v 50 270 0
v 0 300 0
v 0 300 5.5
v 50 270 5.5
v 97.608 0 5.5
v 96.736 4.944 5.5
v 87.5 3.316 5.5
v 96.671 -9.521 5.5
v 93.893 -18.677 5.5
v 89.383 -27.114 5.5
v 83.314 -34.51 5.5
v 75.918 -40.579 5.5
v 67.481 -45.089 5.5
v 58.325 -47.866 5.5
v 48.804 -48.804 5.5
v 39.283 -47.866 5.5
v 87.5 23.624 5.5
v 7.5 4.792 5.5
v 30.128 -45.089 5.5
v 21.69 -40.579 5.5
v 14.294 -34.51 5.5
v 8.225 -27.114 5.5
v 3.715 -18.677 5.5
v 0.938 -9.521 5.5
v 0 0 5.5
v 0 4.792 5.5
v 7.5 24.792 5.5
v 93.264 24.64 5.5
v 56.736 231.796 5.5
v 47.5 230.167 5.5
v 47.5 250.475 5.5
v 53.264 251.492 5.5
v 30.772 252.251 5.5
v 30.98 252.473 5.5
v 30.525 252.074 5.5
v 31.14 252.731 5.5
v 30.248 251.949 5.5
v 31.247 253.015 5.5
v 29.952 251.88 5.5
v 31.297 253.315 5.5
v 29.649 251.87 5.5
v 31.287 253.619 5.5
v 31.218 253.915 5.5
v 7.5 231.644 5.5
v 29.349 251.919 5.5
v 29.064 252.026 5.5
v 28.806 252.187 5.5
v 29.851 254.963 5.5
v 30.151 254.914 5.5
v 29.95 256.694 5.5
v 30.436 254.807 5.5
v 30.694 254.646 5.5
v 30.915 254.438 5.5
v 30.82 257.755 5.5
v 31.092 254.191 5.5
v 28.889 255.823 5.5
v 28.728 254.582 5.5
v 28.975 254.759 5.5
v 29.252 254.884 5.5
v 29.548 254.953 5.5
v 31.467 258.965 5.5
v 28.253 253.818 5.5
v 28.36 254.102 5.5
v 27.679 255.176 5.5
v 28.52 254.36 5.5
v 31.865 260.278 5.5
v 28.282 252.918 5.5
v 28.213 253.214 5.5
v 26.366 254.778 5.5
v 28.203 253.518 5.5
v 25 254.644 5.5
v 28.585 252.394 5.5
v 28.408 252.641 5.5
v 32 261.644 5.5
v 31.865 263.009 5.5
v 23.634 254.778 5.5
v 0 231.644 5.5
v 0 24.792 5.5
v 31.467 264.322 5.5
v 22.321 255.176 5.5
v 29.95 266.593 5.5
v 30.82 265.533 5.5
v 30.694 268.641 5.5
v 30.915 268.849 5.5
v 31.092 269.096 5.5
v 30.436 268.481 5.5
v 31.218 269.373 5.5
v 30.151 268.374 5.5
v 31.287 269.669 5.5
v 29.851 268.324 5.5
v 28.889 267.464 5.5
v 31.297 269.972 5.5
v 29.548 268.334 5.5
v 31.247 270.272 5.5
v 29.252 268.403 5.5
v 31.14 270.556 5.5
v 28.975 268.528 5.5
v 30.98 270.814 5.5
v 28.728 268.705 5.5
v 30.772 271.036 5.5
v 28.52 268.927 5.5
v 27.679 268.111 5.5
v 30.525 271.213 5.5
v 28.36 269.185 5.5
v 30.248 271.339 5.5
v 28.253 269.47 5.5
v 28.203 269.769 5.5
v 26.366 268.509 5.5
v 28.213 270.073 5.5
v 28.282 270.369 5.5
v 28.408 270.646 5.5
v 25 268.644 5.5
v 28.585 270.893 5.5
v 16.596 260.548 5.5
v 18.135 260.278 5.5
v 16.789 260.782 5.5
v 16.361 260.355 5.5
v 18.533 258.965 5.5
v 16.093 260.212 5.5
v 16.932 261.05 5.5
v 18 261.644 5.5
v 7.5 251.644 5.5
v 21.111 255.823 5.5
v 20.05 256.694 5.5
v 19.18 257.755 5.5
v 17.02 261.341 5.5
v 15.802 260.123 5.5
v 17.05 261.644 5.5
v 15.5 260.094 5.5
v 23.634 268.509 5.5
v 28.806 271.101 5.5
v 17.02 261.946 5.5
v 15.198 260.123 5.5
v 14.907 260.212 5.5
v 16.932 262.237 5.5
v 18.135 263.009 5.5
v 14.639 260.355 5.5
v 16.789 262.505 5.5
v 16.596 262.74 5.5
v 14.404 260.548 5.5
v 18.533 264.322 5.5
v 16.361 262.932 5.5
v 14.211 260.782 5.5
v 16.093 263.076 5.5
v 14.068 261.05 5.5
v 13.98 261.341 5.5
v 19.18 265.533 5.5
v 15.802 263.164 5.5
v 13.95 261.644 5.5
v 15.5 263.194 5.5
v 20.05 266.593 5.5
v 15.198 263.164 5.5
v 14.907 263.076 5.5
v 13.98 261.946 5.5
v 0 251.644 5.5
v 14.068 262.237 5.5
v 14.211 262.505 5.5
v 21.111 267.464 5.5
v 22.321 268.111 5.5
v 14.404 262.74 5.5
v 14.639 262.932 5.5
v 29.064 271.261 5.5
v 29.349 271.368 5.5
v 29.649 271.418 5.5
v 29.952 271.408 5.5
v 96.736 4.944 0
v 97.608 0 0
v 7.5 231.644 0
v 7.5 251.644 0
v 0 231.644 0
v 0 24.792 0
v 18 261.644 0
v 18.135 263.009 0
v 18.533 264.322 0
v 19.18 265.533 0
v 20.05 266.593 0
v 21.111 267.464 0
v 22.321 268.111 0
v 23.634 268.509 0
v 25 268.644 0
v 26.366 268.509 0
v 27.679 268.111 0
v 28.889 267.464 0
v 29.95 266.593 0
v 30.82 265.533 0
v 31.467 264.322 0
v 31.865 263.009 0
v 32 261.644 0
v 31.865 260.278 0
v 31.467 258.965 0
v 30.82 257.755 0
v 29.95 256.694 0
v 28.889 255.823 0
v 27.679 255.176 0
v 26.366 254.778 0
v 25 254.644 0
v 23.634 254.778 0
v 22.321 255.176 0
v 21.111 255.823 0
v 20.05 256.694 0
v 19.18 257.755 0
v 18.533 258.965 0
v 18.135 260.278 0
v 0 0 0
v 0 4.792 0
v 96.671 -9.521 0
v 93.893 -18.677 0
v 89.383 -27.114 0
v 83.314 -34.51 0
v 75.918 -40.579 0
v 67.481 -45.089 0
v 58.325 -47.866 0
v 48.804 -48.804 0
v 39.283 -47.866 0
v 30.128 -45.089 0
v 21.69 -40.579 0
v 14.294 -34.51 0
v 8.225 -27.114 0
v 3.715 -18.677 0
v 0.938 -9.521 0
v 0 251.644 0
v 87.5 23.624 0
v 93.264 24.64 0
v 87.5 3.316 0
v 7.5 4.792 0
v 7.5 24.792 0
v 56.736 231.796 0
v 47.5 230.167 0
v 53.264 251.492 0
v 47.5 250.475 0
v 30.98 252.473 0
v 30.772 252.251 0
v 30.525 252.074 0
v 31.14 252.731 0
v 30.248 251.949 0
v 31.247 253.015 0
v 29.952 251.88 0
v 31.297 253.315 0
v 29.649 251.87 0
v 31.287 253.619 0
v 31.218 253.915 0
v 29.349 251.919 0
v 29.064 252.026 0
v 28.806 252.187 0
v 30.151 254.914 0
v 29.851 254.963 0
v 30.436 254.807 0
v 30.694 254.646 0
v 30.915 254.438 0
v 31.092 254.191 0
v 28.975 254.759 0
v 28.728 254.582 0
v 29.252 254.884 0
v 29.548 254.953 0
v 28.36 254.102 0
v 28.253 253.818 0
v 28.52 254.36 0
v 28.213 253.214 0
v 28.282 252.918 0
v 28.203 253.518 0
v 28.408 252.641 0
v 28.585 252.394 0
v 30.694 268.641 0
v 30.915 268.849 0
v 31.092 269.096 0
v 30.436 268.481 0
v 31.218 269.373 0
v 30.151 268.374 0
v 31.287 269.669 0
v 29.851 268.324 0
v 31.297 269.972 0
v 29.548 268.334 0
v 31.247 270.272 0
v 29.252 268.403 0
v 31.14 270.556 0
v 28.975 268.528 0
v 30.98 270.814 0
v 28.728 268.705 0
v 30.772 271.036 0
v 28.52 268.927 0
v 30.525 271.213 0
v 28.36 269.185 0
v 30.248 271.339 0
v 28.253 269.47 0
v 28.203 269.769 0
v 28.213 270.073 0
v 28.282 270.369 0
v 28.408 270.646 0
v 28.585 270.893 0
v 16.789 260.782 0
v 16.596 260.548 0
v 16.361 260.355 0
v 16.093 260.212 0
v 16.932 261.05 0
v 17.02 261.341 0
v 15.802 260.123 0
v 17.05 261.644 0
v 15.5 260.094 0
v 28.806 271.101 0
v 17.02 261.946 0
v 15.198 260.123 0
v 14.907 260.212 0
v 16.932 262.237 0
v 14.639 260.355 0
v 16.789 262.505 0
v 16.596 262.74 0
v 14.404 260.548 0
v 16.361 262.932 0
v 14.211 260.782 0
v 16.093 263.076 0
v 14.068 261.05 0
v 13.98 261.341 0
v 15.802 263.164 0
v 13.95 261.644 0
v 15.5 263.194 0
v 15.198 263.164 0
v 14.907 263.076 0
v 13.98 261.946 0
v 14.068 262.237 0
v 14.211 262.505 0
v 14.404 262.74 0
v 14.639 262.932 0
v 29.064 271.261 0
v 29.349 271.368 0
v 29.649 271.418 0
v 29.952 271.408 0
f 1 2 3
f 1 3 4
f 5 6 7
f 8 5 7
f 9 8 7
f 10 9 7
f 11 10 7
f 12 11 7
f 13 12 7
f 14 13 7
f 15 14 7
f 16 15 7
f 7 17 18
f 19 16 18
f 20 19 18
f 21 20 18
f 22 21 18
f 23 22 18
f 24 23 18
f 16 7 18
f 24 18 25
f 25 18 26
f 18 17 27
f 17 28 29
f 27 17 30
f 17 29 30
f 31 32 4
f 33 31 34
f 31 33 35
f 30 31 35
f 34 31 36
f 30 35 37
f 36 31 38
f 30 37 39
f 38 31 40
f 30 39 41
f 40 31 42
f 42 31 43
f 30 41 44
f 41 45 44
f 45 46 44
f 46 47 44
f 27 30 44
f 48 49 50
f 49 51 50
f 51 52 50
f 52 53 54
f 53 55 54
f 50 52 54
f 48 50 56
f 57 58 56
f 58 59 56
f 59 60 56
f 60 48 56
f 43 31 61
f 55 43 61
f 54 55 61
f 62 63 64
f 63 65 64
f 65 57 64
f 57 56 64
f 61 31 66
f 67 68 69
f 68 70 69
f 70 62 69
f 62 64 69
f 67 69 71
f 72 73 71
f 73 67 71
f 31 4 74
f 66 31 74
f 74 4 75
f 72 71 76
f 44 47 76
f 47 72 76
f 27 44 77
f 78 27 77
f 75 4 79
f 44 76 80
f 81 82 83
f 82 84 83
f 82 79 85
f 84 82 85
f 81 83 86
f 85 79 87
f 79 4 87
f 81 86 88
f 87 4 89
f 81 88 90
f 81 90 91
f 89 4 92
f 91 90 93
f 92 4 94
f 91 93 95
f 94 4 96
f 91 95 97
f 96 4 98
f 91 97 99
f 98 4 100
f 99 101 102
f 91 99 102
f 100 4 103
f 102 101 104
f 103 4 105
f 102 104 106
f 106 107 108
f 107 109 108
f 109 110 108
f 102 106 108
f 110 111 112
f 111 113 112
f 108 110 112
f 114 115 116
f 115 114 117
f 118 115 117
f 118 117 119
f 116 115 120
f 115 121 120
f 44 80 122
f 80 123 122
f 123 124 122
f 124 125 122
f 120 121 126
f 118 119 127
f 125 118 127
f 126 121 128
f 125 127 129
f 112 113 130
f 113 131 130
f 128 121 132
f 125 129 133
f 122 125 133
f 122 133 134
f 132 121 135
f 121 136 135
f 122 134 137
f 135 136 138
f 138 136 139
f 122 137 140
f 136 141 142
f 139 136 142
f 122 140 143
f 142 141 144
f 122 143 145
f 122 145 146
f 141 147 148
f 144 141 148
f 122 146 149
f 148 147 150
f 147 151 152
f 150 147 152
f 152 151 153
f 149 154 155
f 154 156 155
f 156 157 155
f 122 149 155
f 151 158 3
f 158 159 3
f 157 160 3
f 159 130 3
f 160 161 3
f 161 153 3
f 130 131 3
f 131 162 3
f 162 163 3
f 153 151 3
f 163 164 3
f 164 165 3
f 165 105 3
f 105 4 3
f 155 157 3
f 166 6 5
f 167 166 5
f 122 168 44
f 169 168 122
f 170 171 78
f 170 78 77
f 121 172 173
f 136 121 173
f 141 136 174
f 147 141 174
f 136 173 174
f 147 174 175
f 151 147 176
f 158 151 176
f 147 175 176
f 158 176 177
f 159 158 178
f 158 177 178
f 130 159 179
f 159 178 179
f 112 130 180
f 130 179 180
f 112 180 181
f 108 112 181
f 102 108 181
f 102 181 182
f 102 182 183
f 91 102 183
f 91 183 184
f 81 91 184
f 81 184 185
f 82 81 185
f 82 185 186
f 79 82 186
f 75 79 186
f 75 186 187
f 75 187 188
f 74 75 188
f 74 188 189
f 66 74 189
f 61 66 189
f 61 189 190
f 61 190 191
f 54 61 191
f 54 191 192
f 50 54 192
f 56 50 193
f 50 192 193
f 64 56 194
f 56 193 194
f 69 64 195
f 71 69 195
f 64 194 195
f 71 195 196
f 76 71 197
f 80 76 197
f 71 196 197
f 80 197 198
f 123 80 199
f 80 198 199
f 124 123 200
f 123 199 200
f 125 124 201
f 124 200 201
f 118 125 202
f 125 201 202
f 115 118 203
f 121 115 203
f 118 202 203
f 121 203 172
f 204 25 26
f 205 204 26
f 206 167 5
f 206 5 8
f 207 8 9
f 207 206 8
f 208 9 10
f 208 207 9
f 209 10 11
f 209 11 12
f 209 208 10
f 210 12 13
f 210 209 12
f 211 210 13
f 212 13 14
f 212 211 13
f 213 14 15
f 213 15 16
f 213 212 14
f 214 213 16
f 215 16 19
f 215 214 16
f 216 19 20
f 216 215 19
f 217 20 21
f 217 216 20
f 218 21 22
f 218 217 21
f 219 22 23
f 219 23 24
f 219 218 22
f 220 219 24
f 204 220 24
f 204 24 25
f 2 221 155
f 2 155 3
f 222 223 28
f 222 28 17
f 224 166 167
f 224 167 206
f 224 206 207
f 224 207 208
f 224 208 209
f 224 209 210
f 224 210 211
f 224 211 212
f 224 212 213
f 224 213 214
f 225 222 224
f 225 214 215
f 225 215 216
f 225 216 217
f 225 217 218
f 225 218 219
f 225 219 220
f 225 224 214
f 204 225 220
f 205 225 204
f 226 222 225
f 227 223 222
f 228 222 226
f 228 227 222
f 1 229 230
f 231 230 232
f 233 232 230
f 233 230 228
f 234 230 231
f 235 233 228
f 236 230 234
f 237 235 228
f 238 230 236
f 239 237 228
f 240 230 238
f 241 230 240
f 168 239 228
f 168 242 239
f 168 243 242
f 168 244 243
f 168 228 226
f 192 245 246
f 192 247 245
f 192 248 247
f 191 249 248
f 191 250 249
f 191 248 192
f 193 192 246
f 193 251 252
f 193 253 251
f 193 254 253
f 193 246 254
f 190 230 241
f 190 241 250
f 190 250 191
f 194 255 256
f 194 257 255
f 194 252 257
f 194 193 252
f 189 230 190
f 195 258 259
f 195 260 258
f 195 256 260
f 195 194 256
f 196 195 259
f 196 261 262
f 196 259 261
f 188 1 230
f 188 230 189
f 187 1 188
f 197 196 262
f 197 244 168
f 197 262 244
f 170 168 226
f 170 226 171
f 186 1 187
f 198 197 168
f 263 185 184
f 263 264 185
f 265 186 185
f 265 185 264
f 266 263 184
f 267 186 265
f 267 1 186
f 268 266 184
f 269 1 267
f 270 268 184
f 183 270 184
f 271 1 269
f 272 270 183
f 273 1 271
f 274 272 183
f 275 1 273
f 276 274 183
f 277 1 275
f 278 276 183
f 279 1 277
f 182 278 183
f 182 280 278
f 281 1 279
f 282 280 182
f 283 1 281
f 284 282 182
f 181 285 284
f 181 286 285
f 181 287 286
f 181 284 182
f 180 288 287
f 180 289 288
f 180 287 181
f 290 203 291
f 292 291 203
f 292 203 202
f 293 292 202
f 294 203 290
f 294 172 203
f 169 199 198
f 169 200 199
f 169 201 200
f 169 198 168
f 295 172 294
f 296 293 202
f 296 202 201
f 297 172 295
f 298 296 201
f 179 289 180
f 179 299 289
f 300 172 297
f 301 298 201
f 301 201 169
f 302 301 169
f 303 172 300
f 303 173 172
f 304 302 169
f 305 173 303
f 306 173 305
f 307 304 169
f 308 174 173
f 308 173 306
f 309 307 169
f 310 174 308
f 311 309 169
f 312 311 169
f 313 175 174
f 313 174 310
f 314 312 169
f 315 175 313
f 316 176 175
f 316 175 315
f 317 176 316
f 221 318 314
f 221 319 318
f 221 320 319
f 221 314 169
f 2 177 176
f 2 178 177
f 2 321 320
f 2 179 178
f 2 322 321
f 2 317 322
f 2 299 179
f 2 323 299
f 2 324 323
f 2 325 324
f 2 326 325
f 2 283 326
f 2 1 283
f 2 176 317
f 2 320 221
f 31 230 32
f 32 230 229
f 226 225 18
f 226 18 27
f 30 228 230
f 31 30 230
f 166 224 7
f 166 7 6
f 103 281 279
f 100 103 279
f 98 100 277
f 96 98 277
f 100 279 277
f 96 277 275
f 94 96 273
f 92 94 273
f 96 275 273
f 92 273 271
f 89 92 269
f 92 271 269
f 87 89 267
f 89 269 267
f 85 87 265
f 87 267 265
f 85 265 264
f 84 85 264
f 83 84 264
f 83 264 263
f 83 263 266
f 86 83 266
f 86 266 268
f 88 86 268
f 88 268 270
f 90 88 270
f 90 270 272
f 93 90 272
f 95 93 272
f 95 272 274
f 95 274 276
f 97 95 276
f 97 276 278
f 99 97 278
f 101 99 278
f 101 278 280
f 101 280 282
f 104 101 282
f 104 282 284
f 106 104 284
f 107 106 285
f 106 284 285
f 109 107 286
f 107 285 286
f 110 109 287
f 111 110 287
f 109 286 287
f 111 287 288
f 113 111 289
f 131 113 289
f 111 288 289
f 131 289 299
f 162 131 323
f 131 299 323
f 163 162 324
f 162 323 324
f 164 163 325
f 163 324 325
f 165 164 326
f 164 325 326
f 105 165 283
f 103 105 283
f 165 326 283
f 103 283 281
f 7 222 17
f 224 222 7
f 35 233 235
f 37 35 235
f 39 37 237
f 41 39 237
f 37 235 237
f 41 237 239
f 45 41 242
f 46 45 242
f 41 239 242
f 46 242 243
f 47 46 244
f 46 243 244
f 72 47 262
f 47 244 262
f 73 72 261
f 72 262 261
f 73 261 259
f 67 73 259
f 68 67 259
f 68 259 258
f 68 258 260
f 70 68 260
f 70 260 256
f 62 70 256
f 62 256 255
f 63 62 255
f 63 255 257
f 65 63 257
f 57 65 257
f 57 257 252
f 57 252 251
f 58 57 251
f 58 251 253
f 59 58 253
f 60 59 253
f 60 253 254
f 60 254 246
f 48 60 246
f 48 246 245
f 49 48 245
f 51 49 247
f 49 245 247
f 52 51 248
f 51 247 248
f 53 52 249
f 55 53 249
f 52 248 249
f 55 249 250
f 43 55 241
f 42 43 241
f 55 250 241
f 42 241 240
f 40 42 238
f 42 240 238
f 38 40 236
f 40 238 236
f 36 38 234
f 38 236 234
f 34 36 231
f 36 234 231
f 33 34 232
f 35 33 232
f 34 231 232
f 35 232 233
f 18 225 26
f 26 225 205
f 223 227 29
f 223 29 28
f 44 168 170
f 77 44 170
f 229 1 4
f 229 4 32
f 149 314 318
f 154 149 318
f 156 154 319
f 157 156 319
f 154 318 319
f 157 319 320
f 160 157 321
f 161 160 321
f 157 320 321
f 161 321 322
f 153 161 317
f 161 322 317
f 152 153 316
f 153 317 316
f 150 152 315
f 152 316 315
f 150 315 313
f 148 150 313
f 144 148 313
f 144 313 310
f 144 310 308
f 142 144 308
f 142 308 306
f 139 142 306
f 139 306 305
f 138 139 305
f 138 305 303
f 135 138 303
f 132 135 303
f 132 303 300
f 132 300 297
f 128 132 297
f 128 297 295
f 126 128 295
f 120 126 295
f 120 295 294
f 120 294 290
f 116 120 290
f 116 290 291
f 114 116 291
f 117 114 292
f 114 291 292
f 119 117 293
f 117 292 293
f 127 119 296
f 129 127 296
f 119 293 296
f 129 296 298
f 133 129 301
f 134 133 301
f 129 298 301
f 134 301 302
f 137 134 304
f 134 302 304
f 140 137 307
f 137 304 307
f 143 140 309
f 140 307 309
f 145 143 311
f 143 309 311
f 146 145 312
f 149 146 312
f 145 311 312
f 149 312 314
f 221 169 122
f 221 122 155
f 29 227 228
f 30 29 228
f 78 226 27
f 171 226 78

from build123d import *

# Parameters (mm, degrees)
EXTRUDE_1_DEPTH          = 5.5
SKETCH_5_R               = 7
CUT_EXTRUDE_1_DEPTH      = 316.527538037
SKETCH_6_R               = 1.55
CUT_EXTRUDE_2_DEPTH      = 316.527538037
PATTERN_CIRCULAR_1_COUNT = 3
SKETCH_7_W               = 7.5
SKETCH_7_H               = 20
CUT_EXTRUDE_3_DEPTH      = 316.527538037
SKETCH_8_W               = 7.5
SKETCH_8_H               = 20
CUT_EXTRUDE_4_DEPTH      = 316.6542844
CUT_EXTRUDE_5_DEPTH      = 316.6542844
CUT_EXTRUDE_6_DEPTH      = 316.6542844


with BuildPart() as part:
    # ｽｹｯﾁ1 → ﾎﾞｽ - 押し出し1 (new body)
    with BuildSketch(Plane.XY):
        with BuildLine():
            Line((0, 0), (0, 300))
            Line((0, 300), (50, 270))
            Line((50, 270), (97.608284791, 0))
            ThreePointArc((97.608284791, 0), (48.804142396, -48.804142396), (0, 0))
        make_face()
    extrude(amount=EXTRUDE_1_DEPTH)

    # ｽｹｯﾁ5 → ｶｯﾄ - 押し出し1 (cut, through all)
    with BuildSketch(Plane(origin=(0, 0, 0), x_dir=(-1, 0, 0), z_dir=(0, 0, -1))):
        with Locations((-25, 261.643590902)):
            Circle(SKETCH_5_R)
    extrude(amount=-CUT_EXTRUDE_1_DEPTH, mode=Mode.SUBTRACT)

    # ｽｹｯﾁ6 → ｶｯﾄ - 押し出し2 (cut, through all)
    with BuildSketch(Plane(origin=(0, 0, 0), x_dir=(-1, 0, 0), z_dir=(0, 0, -1))):
        with Locations((-15.5, 261.643590902)):
            Circle(SKETCH_6_R)
    cut_extrude_2 = extrude(amount=-CUT_EXTRUDE_2_DEPTH, mode=Mode.SUBTRACT)

    # 円形ﾊﾟﾀｰﾝ1: ｶｯﾄ - 押し出し2 ×3 about axis
    pattern_circular_1_axis = Axis((25, 261.643590902, 0), (0, 0, 1))
    for i in range(1, PATTERN_CIRCULAR_1_COUNT):
        add(cut_extrude_2.rotate(pattern_circular_1_axis, i * 360 / PATTERN_CIRCULAR_1_COUNT), mode=Mode.SUBTRACT)

    # ｽｹｯﾁ7 → ｶｯﾄ - 押し出し3 (cut, through all)
    with BuildSketch(Plane(origin=(0, 0, 0), x_dir=(-1, 0, 0), z_dir=(0, 0, -1))):
        with Locations((-3.75, 14.792318117)):
            Rectangle(SKETCH_7_W, SKETCH_7_H)
    extrude(amount=-CUT_EXTRUDE_3_DEPTH, mode=Mode.SUBTRACT)

    # ｽｹｯﾁ8 → ｶｯﾄ - 押し出し4 (cut, through all)
    with BuildSketch(Plane(origin=(0, 0, -5), x_dir=(-1, 0, 0), z_dir=(0, 0, -1))):
        with Locations((-3.75, 241.643590902)):
            Rectangle(SKETCH_8_W, SKETCH_8_H)
    extrude(amount=-CUT_EXTRUDE_4_DEPTH, mode=Mode.SUBTRACT)

    # ｽｹｯﾁ9 → ｶｯﾄ - 押し出し5 (cut, through all)
    with BuildSketch(Plane(origin=(0, 0, -5), x_dir=(-1, 0, 0), z_dir=(0, 0, -1))):
        Polygon((-96.736481777, 4.944240587), (-93.263518223, 24.640395647), (-87.5, 23.624131881), (-87.5, 3.315599643), align=None)
    extrude(amount=-CUT_EXTRUDE_5_DEPTH, mode=Mode.SUBTRACT)

    # ｽｹｯﾁ10 → ｶｯﾄ - 押し出し6 (cut, through all)
    with BuildSketch(Plane(origin=(0, 0, -5), x_dir=(-1, 0, 0), z_dir=(0, 0, -1))):
        Polygon((-53.263518223, 251.491668432), (-56.736481777, 231.795513372), (-47.5, 230.166872428), (-47.5, 250.475404665), align=None)
    extrude(amount=-CUT_EXTRUDE_6_DEPTH, mode=Mode.SUBTRACT)


solid = part.part
